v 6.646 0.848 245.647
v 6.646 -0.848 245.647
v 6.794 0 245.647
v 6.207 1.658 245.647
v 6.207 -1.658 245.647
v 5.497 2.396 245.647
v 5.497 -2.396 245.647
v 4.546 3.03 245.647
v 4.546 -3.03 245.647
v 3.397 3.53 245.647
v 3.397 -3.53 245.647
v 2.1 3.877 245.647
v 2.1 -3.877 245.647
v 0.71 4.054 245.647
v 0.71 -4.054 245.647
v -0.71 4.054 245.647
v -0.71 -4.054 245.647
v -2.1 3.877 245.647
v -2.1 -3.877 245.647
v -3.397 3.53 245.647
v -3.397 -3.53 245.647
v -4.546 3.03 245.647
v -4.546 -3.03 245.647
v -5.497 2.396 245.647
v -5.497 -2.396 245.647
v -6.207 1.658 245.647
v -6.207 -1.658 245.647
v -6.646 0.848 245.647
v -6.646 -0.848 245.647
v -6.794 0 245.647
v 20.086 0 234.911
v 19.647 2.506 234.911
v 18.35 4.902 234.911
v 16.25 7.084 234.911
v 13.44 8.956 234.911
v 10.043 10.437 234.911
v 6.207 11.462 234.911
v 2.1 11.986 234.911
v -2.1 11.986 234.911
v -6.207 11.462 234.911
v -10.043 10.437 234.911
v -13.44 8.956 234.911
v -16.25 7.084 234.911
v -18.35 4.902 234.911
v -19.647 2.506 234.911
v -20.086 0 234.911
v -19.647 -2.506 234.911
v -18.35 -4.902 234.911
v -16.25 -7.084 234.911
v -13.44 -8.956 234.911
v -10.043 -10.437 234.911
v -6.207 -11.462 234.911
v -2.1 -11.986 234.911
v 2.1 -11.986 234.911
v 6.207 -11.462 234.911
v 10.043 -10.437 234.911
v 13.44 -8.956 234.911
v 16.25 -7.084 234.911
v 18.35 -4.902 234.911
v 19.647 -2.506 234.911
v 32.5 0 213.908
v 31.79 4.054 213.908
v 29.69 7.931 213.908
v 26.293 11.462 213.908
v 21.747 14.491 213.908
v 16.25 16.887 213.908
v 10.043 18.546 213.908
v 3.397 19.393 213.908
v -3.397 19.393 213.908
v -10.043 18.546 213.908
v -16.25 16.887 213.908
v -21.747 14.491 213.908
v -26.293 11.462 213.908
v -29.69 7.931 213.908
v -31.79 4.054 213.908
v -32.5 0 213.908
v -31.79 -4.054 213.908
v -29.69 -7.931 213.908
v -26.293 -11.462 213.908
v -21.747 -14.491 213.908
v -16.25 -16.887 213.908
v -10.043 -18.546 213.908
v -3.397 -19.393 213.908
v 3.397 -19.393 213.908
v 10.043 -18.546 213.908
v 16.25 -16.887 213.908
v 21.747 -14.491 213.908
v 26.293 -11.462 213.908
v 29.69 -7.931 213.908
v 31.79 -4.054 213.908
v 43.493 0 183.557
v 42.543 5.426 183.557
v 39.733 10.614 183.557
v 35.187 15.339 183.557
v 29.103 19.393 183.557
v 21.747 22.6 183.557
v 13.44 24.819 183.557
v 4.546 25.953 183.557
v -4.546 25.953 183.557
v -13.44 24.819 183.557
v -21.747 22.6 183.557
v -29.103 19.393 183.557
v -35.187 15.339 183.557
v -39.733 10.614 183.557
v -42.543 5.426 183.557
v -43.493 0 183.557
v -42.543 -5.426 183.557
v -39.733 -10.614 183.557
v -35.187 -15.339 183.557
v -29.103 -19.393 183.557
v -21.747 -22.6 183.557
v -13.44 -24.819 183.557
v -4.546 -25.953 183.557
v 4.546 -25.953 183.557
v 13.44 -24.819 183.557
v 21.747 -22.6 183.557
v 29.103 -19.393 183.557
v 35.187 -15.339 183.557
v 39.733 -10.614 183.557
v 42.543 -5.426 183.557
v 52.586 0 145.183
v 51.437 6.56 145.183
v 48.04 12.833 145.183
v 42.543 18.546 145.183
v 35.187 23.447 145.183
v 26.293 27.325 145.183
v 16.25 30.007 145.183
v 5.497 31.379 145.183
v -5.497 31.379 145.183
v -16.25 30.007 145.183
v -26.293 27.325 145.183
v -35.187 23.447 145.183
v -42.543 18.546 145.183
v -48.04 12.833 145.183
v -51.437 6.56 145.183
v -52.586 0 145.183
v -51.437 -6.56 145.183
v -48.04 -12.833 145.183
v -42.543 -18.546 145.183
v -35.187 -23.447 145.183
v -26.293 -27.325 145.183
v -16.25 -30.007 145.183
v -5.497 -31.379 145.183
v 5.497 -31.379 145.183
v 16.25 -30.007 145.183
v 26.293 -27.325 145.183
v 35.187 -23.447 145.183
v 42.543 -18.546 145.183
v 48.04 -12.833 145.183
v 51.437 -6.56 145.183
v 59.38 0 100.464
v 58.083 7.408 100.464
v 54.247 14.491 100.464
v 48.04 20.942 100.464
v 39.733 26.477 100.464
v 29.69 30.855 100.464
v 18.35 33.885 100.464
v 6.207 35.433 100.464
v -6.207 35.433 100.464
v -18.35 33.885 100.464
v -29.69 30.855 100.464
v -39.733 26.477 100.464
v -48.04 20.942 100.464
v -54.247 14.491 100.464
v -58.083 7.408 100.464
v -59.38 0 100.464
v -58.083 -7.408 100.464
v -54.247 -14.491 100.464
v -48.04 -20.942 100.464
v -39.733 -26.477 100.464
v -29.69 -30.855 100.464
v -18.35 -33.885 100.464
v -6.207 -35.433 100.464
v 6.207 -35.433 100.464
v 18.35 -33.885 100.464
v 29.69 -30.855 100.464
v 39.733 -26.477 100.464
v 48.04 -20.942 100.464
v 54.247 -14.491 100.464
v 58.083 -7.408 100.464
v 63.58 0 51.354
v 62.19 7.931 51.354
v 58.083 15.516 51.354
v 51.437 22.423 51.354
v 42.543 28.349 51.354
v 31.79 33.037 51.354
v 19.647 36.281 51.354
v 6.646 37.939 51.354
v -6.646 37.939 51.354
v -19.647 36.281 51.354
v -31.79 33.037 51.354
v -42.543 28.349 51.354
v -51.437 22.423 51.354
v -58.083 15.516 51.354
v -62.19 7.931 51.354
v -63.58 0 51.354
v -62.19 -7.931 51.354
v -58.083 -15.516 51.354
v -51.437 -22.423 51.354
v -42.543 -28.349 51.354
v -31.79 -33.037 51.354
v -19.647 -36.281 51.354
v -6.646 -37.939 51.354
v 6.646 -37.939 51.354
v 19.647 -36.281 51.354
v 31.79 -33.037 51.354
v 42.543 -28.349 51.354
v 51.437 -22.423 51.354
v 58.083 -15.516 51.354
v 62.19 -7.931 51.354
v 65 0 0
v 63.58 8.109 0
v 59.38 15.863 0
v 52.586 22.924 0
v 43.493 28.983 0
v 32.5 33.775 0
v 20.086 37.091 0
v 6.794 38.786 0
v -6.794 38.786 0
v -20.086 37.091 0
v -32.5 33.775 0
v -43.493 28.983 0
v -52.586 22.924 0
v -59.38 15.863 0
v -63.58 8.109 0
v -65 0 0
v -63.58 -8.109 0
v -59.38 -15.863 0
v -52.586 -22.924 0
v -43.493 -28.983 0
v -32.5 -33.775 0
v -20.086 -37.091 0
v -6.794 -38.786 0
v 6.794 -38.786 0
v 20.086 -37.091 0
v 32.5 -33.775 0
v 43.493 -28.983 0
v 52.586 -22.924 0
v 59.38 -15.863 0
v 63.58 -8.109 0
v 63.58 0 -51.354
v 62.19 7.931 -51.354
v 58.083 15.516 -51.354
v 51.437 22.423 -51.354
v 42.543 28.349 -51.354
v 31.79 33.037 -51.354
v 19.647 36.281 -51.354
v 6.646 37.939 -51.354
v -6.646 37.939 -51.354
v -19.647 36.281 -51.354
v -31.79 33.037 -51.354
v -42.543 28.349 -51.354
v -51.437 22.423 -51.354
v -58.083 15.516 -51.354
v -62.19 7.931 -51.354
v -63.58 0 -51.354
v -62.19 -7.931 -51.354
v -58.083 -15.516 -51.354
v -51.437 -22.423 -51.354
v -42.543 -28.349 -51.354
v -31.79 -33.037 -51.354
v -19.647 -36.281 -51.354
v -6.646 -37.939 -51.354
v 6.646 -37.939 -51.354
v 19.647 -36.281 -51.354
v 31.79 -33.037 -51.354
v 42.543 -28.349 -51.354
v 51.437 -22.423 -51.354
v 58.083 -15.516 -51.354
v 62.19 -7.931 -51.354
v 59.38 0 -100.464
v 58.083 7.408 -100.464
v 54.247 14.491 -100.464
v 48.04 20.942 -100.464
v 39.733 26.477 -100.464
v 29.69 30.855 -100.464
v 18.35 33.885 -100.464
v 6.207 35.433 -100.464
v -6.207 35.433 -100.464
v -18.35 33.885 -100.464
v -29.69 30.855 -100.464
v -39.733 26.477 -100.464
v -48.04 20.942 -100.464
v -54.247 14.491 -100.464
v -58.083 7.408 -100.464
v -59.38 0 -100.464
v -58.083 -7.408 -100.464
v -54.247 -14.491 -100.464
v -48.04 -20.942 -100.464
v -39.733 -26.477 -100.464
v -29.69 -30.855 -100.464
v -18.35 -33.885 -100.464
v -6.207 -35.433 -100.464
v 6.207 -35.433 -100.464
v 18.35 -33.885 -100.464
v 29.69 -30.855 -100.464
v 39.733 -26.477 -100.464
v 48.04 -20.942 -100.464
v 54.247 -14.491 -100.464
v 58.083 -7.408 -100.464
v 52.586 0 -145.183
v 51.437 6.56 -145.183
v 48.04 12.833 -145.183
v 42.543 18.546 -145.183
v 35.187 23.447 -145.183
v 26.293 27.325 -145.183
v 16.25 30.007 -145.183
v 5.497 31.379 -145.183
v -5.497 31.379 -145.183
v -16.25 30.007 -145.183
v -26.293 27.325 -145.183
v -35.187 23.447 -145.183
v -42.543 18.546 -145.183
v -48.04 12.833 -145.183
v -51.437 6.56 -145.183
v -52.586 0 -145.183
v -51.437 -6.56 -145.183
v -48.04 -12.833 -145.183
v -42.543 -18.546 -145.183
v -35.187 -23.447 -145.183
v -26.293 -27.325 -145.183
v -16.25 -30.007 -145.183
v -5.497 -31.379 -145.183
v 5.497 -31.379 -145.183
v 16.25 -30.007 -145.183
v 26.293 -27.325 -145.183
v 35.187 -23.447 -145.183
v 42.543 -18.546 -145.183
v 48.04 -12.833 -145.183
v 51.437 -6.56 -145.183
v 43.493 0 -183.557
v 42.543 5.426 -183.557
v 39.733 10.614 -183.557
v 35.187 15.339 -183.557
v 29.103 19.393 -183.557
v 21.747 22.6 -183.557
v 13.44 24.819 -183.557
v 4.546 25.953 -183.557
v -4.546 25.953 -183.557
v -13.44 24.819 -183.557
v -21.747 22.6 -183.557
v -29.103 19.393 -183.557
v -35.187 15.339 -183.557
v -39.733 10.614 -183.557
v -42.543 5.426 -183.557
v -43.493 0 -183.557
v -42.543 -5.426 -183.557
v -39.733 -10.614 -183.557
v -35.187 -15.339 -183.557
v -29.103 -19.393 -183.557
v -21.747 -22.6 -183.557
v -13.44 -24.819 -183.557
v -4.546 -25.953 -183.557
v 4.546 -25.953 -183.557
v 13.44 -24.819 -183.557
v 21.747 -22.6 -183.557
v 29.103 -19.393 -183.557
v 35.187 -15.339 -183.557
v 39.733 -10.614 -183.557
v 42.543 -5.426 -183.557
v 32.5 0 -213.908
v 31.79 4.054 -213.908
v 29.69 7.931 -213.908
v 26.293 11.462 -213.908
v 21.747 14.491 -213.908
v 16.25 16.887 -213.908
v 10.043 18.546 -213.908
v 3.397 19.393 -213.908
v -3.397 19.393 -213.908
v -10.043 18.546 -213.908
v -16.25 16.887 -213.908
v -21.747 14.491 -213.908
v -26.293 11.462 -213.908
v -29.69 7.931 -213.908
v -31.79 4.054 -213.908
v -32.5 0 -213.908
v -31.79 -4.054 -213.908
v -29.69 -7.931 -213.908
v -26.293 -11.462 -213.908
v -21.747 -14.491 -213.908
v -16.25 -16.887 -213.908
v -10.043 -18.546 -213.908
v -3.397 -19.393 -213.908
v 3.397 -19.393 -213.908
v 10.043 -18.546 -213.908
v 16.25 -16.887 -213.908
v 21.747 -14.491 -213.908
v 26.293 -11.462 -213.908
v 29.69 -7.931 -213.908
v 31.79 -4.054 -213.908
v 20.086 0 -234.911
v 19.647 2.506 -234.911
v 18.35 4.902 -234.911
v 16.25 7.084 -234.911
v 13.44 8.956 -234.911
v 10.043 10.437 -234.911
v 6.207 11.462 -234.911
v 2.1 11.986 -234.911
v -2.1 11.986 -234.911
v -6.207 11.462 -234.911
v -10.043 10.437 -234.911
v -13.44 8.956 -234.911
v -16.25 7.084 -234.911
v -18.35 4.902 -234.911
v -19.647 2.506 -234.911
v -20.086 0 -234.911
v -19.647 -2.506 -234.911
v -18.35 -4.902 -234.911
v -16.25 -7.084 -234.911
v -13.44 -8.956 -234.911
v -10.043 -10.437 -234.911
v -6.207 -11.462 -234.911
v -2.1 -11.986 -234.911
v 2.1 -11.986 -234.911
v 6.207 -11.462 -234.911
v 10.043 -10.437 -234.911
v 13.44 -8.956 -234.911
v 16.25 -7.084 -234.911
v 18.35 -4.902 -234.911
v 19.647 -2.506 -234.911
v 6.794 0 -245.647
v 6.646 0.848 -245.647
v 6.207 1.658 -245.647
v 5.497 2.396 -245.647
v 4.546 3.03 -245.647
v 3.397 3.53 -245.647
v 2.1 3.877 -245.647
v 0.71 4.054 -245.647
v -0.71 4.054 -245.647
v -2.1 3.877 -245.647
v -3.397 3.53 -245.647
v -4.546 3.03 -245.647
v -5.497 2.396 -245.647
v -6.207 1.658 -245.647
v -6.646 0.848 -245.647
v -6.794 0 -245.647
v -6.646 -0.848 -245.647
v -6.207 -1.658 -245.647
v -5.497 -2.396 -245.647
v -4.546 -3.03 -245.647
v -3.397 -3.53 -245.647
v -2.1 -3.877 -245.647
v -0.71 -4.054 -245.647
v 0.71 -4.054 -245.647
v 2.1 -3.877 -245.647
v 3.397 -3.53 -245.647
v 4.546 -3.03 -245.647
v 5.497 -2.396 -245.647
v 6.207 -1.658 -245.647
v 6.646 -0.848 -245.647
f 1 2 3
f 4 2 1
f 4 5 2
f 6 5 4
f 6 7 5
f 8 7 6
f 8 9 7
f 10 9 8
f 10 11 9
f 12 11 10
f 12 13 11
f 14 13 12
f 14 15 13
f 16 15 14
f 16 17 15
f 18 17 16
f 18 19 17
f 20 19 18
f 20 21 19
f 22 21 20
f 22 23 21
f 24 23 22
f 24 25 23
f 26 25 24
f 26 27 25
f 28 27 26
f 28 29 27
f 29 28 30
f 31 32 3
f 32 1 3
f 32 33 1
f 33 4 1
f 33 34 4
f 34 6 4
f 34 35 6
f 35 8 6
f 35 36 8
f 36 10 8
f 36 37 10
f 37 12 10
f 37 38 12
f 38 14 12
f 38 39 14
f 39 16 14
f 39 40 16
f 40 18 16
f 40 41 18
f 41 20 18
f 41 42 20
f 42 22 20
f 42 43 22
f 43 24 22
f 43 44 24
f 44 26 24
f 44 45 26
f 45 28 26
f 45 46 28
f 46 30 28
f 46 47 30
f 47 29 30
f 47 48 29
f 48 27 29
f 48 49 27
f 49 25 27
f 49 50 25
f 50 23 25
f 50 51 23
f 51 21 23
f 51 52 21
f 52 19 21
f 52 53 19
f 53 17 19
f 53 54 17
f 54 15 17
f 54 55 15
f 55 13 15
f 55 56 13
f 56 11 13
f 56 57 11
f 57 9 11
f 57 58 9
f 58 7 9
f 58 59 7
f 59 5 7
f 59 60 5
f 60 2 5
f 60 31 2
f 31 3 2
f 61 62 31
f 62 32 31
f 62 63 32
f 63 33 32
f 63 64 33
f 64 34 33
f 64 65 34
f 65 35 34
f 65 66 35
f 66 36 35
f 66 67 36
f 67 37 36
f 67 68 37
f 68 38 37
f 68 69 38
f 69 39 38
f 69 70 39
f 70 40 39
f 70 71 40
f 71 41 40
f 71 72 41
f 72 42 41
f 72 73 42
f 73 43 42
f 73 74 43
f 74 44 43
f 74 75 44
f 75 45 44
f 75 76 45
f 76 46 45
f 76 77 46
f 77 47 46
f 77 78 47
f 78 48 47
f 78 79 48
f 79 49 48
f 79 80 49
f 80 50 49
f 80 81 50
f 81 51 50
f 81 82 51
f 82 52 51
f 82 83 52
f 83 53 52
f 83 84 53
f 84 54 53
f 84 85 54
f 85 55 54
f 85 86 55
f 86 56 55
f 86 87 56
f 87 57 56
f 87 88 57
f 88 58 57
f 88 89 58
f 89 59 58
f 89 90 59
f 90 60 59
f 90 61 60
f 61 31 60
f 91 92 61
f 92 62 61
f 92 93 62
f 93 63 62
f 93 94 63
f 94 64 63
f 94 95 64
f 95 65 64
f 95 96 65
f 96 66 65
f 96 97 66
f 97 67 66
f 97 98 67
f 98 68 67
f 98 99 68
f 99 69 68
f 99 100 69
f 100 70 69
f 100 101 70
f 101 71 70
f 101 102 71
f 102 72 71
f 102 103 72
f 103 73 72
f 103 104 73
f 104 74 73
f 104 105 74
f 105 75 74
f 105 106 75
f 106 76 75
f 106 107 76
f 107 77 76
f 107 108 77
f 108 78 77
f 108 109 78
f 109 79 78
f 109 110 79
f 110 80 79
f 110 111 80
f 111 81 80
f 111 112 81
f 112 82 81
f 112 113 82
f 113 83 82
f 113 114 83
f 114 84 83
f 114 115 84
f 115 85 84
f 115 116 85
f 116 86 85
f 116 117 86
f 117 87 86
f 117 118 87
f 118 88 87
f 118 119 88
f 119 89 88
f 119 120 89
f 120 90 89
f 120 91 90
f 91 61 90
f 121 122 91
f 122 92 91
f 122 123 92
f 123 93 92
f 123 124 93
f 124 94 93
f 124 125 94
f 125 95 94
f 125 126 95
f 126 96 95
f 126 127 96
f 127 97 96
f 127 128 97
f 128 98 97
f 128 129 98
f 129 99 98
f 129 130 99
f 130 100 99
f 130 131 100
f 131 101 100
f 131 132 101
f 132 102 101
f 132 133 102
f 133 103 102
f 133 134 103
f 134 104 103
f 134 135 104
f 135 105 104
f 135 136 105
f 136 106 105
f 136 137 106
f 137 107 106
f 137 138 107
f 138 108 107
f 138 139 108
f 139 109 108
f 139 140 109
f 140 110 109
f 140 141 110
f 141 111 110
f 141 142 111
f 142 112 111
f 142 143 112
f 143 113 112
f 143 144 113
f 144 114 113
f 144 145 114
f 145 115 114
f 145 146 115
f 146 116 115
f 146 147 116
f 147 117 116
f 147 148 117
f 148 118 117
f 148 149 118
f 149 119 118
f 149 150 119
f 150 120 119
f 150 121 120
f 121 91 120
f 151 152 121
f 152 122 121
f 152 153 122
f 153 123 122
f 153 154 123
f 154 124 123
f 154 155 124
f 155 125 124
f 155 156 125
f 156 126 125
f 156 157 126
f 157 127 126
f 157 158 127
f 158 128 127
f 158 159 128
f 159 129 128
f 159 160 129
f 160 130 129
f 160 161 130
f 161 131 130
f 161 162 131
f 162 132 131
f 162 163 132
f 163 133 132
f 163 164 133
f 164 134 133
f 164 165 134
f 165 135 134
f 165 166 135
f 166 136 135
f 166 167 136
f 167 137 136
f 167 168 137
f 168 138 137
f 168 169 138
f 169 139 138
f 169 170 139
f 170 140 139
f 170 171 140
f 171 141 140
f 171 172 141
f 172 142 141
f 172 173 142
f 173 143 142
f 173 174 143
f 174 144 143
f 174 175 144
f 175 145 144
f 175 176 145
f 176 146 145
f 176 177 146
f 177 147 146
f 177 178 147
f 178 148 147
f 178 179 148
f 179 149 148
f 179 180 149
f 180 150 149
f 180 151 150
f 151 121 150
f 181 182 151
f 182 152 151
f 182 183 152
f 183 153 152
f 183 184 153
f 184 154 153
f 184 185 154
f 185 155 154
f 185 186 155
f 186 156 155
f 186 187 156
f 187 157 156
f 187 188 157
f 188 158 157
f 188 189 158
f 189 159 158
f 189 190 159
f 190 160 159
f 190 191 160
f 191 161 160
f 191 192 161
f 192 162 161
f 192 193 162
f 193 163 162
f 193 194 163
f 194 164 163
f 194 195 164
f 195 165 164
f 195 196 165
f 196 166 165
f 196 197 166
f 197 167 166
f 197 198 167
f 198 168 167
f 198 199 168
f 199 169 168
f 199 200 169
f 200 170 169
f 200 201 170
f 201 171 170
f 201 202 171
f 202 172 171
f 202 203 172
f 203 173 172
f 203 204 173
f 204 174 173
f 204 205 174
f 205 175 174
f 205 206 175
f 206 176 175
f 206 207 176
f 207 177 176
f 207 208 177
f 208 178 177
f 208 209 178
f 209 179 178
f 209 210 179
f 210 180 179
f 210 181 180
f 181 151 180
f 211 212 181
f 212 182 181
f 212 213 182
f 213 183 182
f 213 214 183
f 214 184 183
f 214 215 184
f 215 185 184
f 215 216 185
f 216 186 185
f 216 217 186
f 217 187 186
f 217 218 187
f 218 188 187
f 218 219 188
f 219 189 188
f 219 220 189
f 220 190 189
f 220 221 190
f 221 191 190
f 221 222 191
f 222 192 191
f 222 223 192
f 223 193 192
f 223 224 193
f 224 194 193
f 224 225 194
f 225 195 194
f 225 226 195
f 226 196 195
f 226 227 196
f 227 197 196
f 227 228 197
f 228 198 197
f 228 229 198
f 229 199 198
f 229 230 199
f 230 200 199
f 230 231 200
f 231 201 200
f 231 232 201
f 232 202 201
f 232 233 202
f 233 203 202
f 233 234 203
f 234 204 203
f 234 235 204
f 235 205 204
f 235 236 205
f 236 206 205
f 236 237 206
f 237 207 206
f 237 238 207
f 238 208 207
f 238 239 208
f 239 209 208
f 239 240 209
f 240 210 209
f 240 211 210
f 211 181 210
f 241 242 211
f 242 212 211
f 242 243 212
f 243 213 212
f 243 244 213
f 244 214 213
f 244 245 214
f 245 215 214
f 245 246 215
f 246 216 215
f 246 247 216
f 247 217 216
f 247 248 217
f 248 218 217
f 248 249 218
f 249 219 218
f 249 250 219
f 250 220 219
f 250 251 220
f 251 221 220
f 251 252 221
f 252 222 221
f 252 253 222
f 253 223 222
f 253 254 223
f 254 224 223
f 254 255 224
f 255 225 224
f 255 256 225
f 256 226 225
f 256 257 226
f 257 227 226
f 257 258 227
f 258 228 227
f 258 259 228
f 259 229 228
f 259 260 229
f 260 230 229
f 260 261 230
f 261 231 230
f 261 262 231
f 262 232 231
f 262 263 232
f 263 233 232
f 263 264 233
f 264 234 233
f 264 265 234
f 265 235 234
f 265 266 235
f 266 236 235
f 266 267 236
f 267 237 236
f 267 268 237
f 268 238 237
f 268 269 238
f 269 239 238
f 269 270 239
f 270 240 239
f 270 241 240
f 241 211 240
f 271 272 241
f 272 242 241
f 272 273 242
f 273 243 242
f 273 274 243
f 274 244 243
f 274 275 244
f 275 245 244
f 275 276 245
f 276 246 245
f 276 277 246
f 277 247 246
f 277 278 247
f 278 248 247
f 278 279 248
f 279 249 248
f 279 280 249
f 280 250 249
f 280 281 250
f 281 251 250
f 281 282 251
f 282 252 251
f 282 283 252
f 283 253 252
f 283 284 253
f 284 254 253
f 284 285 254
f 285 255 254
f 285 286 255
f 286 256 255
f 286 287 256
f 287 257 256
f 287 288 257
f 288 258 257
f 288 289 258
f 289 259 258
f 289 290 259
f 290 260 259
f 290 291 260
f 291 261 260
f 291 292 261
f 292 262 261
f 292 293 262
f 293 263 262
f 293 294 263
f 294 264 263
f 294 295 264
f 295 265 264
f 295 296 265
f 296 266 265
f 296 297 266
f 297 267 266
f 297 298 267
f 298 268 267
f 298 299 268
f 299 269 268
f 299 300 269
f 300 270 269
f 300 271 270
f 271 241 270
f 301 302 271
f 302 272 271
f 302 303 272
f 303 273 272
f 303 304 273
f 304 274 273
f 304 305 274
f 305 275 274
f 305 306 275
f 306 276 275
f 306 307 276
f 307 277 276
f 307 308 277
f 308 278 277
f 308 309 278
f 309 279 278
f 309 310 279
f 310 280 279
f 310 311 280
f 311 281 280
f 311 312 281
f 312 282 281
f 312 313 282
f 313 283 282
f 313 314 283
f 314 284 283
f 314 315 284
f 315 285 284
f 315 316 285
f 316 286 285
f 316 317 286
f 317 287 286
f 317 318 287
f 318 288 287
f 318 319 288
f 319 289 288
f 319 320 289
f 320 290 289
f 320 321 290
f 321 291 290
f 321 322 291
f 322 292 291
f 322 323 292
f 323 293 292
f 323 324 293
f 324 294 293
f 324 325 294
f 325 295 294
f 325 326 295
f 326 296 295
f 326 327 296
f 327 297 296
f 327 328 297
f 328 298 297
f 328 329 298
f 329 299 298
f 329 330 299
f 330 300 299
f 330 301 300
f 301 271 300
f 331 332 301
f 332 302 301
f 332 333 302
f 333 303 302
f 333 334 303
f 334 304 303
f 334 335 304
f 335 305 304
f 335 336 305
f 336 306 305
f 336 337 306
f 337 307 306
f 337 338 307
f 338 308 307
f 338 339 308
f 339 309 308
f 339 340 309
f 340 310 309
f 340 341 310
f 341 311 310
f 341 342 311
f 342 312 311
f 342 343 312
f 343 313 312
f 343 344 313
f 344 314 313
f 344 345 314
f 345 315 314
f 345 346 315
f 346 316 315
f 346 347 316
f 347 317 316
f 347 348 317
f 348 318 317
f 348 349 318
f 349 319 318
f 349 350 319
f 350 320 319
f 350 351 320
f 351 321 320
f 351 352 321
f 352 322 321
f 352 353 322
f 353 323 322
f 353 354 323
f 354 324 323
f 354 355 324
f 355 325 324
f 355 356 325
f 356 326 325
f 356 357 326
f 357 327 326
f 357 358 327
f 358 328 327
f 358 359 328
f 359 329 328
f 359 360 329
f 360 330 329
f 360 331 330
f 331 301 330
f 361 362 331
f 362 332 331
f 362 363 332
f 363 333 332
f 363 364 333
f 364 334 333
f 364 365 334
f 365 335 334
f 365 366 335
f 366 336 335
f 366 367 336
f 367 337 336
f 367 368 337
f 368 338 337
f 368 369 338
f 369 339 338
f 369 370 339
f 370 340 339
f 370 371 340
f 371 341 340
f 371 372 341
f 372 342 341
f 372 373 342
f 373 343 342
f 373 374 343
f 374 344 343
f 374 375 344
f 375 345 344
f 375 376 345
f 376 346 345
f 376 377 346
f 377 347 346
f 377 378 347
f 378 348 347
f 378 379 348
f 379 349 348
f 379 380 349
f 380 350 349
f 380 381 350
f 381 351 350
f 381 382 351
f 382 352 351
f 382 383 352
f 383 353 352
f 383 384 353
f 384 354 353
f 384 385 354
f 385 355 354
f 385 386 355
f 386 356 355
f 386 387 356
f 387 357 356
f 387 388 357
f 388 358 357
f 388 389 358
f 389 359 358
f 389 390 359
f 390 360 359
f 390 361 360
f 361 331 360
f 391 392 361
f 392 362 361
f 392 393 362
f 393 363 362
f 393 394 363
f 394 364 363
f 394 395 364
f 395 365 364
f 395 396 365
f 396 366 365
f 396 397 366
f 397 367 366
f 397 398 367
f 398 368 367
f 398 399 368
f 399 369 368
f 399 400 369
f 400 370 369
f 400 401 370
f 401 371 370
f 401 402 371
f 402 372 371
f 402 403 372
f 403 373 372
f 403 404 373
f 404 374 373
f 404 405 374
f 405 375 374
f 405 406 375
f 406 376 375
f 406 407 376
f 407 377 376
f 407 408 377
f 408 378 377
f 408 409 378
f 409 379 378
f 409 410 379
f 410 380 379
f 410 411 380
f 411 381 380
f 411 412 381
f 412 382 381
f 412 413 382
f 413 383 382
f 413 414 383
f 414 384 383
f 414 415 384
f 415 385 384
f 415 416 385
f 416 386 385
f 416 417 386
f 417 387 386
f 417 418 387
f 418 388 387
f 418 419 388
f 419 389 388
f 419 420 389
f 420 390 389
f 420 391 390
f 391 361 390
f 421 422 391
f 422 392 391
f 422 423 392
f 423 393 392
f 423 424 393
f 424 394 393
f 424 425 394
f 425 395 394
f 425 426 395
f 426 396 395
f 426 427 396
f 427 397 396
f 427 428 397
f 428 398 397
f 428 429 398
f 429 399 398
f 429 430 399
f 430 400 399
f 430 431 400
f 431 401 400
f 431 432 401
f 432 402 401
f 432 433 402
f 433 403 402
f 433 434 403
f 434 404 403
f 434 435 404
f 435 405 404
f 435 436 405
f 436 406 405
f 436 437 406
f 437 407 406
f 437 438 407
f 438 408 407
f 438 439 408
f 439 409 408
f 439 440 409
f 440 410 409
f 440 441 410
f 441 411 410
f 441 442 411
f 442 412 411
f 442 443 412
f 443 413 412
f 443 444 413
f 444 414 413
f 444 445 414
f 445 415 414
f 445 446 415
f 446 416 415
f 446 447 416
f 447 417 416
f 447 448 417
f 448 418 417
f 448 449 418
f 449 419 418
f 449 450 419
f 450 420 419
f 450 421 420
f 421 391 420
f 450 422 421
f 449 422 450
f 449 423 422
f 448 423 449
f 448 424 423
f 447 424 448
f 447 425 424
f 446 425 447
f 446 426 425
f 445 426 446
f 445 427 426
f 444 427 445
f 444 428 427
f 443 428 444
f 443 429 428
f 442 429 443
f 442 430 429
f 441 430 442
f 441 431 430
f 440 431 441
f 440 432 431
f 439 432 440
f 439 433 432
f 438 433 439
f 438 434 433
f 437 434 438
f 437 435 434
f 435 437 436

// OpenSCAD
// Generated by SolidPython 1.0.1 on 2020-07-29 00:46:46


scale(v = [5, 3, 19]) {
	sphere(r = 13);
}
/***********************************************
*********      SolidPython code:      **********
************************************************
 
# import packages: SolidPython
from solid import *
from solid.utils import *
from itertools import chain, combinations, permutations


class Resize:

    def __init__(self, scad_file):
        self.scad_file = scad_file
        #self.scad_file = import_scad(scad_file)
        # cone/cylinder param:
        self.r1 = 0
        self.r2 = 0
        self.h = 0
        # rectangular prism param:
        self.w = 0
        self.l = 0
        # ellipse param:
        self.r = 0

    # import OpenScad code (file name corresponds to shape)


    # classify shape + parameters
    def assign(self, param1, param2, param3):
        if self.scad_file == 'cone.scad':
            self.r1 = param1
            self.r2 = param2
            self.h = param3
        elif self.scad_file == 'cylinder.scad':
            self.r1 = param1
            self.r2 = param2
            self.h = param3
        elif self.scad_file == 'rectangularPrism.scad':
            self.h = param1
            self.l = param2
            self.w = param3
        else:
            self.r = param1
            self.h = param2

    # resize parameters
    def iterate(self):
        x = range(3, 20, 2)
        i = 1
        if self.scad_file == 'cone.scad':
            tempList = list(permutations(x, 2))
            for temp in tempList:
                param1 = temp[0]
                param2 = temp[1]
                filepath = 'produced_scad_files/' + 'cone' + str(param1) + '_' + str(param2) + '_' + '.scad'
                scad_render_to_file(cylinder(h=param1, r1=param2, r2=0), filepath)

        elif self.scad_file == 'cylinder.scad':
            tempList = list(permutations(x, 3))
            for temp in tempList:
                param1 = temp[0]
                param2 = temp[1]
                filepath = 'produced_scad_files/' + 'cylinder' + str(param1) + '_' + str(param2) + '_' + '.scad'
                scad_render_to_file(cylinder(h=param1, r1=param2, r2=param2), filepath)

        elif self.scad_file == 'rectangularPrism.scad':
            tempList = list(permutations(x, 3))
            for temp in tempList:
                param1 = temp[0]
                param2 = temp[1]
                param3 = temp[2]
                filepath = 'produced_scad_files/' + 'rectangularPrism' + str(param1) + '_' + str(param2) + '_' + str(
                    param3) + '.scad'
                scad_render_to_file(cube(size=(param1, param2, param3)), filepath)

        elif self.scad_file == 'ellipse.scad':
            tempList = list(permutations(x, 4))
            for temp in tempList:
                param1 = temp[0]
                param2 = temp[1]
                param3 = temp[2]
                param4 = temp[3]
                filepath = 'produced_scad_files/' + 'ellipse' + str(param1) + '_' + str(param2) + '_' + str(param3) + '_' + str(param4) + '.scad'
                scad_render_to_file(scale([param1, param2, param3])(sphere(r=param4)), filepath)

    def render_to_scadfile(self):
        scad_render_to_file(scad, 'example.scad') 
 
************************************************/
